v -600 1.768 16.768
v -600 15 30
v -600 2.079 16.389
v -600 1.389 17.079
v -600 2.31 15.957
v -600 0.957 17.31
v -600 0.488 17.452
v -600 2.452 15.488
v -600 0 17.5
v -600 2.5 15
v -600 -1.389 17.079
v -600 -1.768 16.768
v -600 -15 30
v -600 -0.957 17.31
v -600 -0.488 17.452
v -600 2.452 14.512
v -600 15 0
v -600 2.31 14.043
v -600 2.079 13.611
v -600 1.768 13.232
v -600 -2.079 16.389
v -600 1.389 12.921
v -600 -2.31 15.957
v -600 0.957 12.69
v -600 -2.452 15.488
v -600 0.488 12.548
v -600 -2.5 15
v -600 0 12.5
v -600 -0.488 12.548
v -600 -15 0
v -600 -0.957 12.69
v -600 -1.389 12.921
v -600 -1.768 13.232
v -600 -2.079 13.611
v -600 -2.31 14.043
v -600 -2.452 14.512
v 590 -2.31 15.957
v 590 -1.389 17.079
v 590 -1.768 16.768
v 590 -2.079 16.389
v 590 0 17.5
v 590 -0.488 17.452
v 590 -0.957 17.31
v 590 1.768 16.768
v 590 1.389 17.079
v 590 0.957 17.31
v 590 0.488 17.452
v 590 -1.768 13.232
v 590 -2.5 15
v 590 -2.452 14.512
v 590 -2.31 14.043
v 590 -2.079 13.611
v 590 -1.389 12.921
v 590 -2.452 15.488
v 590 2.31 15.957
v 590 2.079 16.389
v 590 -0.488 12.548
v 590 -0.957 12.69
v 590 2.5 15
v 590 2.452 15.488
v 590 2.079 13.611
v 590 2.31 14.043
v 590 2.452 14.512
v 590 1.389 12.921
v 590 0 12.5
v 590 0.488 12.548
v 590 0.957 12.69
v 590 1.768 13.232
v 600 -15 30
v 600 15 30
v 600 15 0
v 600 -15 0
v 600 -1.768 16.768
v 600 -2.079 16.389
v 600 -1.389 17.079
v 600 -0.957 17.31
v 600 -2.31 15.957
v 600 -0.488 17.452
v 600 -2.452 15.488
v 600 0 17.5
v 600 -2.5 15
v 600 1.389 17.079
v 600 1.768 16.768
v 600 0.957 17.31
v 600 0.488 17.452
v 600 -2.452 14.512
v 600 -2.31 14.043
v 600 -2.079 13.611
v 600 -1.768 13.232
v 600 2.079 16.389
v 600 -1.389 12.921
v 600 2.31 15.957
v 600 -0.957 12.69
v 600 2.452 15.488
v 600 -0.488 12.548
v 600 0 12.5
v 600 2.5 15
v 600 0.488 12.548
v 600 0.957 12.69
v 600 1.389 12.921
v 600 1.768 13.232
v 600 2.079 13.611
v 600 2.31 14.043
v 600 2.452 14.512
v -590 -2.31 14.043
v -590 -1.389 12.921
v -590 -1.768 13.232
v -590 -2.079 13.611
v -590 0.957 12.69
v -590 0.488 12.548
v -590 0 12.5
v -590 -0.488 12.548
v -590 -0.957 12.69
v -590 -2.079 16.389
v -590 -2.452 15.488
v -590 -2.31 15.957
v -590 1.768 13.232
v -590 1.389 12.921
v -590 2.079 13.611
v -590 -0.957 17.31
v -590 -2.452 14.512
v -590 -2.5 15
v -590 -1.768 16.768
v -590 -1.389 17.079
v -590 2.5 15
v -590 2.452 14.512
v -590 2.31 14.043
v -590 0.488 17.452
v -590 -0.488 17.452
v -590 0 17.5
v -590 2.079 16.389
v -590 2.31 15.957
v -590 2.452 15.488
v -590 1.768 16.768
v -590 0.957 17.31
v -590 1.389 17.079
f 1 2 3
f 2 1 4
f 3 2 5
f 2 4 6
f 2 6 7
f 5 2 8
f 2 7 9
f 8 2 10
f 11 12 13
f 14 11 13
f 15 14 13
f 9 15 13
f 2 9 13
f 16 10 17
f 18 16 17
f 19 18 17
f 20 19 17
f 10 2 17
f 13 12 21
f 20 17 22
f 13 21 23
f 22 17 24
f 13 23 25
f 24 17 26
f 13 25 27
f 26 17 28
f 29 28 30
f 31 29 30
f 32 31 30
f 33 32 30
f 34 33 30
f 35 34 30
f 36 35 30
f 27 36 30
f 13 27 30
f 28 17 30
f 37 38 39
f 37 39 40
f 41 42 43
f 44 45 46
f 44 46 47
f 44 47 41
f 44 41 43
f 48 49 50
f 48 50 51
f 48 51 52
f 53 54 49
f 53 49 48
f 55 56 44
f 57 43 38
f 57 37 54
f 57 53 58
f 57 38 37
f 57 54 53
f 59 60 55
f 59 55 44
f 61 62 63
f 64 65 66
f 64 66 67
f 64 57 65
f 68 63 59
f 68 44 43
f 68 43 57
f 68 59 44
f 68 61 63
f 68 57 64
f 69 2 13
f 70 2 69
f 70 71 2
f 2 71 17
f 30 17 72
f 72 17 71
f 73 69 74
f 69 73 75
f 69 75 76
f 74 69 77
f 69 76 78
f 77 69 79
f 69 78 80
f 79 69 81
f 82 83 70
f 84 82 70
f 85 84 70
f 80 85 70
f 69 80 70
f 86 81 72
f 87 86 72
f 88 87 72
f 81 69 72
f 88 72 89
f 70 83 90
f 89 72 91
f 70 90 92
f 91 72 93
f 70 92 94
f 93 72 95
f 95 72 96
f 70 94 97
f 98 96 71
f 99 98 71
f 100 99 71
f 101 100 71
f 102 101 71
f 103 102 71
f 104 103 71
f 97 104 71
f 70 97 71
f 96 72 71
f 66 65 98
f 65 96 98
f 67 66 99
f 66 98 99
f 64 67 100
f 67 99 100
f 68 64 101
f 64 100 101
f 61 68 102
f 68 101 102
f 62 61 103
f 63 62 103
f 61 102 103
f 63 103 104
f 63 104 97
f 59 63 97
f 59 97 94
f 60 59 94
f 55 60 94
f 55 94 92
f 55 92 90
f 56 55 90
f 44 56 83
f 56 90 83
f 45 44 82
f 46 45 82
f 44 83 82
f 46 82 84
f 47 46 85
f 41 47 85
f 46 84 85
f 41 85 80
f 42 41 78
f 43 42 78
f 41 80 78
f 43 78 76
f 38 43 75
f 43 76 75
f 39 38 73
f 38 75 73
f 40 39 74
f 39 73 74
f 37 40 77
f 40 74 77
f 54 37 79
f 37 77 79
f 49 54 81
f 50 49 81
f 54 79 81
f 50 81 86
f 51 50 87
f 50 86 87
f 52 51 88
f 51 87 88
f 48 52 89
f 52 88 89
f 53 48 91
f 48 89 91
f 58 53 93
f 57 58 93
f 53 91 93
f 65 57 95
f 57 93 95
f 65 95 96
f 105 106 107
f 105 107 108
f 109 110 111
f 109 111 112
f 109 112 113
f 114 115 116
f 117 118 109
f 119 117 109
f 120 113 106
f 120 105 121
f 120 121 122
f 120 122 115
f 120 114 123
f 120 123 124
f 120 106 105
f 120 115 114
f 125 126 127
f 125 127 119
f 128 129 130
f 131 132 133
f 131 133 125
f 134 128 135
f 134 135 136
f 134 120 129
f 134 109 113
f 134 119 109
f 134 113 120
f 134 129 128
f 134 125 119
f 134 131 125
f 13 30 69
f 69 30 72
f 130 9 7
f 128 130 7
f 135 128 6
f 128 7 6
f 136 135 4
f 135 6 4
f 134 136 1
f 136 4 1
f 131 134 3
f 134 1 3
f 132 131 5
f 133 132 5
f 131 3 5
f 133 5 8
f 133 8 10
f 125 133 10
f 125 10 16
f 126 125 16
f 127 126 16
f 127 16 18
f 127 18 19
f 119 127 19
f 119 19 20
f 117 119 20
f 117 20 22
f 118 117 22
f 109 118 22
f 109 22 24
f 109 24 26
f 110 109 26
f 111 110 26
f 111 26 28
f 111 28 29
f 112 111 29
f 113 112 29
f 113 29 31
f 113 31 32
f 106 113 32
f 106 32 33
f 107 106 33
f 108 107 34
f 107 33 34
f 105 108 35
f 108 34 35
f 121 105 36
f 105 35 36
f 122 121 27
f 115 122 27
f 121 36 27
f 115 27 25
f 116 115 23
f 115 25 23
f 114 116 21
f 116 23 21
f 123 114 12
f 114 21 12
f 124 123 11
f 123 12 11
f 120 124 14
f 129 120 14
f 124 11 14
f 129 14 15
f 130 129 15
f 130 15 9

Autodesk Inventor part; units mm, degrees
ref_plane "YZ Plane" through (0, 0, 0) normal (1, 0, 0) x (0, 1, 0)
ref_plane "XZ Plane" through (0, 0, 0) normal (0, 1, 0) x (-1, 0, 0)
ref_plane "XY Plane" through (0, 0, 0) normal (0, 0, 1) x (1, 0, 0)
sketch "Sketch1" plane through (0, 0, 0) normal (0, 0, 1) x (1, 0, 0)
  line L0 (-600, -15) -> (600, -15)
  line L1 (600, -15) -> (600, 15)
  line L2 (600, 15) -> (-600, 15)
  line L3 (-600, 15) -> (-600, -15)
  line L4 (-600, -15) -> (600, 15) construction
  line L5 (600, -15) -> (-600, 15) construction
  point P0 (0, 0)
  dimension "d0" = 1200
  dimension "d1" = 30
extrude "Extrusion1" add sketch "Sketch1" along normal blind 30
sketch "Sketch2" plane through (600, -15, 0) normal (1, 0, 0) x (0, 0, -1)
  line L0 (0, 0) -> (0, 30) projected
  line L1 (0, 30) -> (-30, 30) projected
  line L2 (-30, 0) -> (-30, 30) projected
  line L3 (0, 0) -> (-30, 0) projected
  circle A0 centre (-15, 15) radius 15 construction
  circle A1 centre (-15, 15) radius 2.5
  point P0 (0, 15)
  dimension "d13" = 5
extrude "Extrusion2" cut sketch "Sketch2" against normal blind 10 contours A1
sketch "Sketch3" plane through (-600, -15, 0) normal (-1, 0, 0) x (0, 0, 1)
  circle A0 centre (15, 15) radius 2.5 projected
  point P0 (0, 15)
extrude "Extrusion3" cut sketch "Sketch3" against normal blind 10
properties part number "lange_Stange" material "Birch"
